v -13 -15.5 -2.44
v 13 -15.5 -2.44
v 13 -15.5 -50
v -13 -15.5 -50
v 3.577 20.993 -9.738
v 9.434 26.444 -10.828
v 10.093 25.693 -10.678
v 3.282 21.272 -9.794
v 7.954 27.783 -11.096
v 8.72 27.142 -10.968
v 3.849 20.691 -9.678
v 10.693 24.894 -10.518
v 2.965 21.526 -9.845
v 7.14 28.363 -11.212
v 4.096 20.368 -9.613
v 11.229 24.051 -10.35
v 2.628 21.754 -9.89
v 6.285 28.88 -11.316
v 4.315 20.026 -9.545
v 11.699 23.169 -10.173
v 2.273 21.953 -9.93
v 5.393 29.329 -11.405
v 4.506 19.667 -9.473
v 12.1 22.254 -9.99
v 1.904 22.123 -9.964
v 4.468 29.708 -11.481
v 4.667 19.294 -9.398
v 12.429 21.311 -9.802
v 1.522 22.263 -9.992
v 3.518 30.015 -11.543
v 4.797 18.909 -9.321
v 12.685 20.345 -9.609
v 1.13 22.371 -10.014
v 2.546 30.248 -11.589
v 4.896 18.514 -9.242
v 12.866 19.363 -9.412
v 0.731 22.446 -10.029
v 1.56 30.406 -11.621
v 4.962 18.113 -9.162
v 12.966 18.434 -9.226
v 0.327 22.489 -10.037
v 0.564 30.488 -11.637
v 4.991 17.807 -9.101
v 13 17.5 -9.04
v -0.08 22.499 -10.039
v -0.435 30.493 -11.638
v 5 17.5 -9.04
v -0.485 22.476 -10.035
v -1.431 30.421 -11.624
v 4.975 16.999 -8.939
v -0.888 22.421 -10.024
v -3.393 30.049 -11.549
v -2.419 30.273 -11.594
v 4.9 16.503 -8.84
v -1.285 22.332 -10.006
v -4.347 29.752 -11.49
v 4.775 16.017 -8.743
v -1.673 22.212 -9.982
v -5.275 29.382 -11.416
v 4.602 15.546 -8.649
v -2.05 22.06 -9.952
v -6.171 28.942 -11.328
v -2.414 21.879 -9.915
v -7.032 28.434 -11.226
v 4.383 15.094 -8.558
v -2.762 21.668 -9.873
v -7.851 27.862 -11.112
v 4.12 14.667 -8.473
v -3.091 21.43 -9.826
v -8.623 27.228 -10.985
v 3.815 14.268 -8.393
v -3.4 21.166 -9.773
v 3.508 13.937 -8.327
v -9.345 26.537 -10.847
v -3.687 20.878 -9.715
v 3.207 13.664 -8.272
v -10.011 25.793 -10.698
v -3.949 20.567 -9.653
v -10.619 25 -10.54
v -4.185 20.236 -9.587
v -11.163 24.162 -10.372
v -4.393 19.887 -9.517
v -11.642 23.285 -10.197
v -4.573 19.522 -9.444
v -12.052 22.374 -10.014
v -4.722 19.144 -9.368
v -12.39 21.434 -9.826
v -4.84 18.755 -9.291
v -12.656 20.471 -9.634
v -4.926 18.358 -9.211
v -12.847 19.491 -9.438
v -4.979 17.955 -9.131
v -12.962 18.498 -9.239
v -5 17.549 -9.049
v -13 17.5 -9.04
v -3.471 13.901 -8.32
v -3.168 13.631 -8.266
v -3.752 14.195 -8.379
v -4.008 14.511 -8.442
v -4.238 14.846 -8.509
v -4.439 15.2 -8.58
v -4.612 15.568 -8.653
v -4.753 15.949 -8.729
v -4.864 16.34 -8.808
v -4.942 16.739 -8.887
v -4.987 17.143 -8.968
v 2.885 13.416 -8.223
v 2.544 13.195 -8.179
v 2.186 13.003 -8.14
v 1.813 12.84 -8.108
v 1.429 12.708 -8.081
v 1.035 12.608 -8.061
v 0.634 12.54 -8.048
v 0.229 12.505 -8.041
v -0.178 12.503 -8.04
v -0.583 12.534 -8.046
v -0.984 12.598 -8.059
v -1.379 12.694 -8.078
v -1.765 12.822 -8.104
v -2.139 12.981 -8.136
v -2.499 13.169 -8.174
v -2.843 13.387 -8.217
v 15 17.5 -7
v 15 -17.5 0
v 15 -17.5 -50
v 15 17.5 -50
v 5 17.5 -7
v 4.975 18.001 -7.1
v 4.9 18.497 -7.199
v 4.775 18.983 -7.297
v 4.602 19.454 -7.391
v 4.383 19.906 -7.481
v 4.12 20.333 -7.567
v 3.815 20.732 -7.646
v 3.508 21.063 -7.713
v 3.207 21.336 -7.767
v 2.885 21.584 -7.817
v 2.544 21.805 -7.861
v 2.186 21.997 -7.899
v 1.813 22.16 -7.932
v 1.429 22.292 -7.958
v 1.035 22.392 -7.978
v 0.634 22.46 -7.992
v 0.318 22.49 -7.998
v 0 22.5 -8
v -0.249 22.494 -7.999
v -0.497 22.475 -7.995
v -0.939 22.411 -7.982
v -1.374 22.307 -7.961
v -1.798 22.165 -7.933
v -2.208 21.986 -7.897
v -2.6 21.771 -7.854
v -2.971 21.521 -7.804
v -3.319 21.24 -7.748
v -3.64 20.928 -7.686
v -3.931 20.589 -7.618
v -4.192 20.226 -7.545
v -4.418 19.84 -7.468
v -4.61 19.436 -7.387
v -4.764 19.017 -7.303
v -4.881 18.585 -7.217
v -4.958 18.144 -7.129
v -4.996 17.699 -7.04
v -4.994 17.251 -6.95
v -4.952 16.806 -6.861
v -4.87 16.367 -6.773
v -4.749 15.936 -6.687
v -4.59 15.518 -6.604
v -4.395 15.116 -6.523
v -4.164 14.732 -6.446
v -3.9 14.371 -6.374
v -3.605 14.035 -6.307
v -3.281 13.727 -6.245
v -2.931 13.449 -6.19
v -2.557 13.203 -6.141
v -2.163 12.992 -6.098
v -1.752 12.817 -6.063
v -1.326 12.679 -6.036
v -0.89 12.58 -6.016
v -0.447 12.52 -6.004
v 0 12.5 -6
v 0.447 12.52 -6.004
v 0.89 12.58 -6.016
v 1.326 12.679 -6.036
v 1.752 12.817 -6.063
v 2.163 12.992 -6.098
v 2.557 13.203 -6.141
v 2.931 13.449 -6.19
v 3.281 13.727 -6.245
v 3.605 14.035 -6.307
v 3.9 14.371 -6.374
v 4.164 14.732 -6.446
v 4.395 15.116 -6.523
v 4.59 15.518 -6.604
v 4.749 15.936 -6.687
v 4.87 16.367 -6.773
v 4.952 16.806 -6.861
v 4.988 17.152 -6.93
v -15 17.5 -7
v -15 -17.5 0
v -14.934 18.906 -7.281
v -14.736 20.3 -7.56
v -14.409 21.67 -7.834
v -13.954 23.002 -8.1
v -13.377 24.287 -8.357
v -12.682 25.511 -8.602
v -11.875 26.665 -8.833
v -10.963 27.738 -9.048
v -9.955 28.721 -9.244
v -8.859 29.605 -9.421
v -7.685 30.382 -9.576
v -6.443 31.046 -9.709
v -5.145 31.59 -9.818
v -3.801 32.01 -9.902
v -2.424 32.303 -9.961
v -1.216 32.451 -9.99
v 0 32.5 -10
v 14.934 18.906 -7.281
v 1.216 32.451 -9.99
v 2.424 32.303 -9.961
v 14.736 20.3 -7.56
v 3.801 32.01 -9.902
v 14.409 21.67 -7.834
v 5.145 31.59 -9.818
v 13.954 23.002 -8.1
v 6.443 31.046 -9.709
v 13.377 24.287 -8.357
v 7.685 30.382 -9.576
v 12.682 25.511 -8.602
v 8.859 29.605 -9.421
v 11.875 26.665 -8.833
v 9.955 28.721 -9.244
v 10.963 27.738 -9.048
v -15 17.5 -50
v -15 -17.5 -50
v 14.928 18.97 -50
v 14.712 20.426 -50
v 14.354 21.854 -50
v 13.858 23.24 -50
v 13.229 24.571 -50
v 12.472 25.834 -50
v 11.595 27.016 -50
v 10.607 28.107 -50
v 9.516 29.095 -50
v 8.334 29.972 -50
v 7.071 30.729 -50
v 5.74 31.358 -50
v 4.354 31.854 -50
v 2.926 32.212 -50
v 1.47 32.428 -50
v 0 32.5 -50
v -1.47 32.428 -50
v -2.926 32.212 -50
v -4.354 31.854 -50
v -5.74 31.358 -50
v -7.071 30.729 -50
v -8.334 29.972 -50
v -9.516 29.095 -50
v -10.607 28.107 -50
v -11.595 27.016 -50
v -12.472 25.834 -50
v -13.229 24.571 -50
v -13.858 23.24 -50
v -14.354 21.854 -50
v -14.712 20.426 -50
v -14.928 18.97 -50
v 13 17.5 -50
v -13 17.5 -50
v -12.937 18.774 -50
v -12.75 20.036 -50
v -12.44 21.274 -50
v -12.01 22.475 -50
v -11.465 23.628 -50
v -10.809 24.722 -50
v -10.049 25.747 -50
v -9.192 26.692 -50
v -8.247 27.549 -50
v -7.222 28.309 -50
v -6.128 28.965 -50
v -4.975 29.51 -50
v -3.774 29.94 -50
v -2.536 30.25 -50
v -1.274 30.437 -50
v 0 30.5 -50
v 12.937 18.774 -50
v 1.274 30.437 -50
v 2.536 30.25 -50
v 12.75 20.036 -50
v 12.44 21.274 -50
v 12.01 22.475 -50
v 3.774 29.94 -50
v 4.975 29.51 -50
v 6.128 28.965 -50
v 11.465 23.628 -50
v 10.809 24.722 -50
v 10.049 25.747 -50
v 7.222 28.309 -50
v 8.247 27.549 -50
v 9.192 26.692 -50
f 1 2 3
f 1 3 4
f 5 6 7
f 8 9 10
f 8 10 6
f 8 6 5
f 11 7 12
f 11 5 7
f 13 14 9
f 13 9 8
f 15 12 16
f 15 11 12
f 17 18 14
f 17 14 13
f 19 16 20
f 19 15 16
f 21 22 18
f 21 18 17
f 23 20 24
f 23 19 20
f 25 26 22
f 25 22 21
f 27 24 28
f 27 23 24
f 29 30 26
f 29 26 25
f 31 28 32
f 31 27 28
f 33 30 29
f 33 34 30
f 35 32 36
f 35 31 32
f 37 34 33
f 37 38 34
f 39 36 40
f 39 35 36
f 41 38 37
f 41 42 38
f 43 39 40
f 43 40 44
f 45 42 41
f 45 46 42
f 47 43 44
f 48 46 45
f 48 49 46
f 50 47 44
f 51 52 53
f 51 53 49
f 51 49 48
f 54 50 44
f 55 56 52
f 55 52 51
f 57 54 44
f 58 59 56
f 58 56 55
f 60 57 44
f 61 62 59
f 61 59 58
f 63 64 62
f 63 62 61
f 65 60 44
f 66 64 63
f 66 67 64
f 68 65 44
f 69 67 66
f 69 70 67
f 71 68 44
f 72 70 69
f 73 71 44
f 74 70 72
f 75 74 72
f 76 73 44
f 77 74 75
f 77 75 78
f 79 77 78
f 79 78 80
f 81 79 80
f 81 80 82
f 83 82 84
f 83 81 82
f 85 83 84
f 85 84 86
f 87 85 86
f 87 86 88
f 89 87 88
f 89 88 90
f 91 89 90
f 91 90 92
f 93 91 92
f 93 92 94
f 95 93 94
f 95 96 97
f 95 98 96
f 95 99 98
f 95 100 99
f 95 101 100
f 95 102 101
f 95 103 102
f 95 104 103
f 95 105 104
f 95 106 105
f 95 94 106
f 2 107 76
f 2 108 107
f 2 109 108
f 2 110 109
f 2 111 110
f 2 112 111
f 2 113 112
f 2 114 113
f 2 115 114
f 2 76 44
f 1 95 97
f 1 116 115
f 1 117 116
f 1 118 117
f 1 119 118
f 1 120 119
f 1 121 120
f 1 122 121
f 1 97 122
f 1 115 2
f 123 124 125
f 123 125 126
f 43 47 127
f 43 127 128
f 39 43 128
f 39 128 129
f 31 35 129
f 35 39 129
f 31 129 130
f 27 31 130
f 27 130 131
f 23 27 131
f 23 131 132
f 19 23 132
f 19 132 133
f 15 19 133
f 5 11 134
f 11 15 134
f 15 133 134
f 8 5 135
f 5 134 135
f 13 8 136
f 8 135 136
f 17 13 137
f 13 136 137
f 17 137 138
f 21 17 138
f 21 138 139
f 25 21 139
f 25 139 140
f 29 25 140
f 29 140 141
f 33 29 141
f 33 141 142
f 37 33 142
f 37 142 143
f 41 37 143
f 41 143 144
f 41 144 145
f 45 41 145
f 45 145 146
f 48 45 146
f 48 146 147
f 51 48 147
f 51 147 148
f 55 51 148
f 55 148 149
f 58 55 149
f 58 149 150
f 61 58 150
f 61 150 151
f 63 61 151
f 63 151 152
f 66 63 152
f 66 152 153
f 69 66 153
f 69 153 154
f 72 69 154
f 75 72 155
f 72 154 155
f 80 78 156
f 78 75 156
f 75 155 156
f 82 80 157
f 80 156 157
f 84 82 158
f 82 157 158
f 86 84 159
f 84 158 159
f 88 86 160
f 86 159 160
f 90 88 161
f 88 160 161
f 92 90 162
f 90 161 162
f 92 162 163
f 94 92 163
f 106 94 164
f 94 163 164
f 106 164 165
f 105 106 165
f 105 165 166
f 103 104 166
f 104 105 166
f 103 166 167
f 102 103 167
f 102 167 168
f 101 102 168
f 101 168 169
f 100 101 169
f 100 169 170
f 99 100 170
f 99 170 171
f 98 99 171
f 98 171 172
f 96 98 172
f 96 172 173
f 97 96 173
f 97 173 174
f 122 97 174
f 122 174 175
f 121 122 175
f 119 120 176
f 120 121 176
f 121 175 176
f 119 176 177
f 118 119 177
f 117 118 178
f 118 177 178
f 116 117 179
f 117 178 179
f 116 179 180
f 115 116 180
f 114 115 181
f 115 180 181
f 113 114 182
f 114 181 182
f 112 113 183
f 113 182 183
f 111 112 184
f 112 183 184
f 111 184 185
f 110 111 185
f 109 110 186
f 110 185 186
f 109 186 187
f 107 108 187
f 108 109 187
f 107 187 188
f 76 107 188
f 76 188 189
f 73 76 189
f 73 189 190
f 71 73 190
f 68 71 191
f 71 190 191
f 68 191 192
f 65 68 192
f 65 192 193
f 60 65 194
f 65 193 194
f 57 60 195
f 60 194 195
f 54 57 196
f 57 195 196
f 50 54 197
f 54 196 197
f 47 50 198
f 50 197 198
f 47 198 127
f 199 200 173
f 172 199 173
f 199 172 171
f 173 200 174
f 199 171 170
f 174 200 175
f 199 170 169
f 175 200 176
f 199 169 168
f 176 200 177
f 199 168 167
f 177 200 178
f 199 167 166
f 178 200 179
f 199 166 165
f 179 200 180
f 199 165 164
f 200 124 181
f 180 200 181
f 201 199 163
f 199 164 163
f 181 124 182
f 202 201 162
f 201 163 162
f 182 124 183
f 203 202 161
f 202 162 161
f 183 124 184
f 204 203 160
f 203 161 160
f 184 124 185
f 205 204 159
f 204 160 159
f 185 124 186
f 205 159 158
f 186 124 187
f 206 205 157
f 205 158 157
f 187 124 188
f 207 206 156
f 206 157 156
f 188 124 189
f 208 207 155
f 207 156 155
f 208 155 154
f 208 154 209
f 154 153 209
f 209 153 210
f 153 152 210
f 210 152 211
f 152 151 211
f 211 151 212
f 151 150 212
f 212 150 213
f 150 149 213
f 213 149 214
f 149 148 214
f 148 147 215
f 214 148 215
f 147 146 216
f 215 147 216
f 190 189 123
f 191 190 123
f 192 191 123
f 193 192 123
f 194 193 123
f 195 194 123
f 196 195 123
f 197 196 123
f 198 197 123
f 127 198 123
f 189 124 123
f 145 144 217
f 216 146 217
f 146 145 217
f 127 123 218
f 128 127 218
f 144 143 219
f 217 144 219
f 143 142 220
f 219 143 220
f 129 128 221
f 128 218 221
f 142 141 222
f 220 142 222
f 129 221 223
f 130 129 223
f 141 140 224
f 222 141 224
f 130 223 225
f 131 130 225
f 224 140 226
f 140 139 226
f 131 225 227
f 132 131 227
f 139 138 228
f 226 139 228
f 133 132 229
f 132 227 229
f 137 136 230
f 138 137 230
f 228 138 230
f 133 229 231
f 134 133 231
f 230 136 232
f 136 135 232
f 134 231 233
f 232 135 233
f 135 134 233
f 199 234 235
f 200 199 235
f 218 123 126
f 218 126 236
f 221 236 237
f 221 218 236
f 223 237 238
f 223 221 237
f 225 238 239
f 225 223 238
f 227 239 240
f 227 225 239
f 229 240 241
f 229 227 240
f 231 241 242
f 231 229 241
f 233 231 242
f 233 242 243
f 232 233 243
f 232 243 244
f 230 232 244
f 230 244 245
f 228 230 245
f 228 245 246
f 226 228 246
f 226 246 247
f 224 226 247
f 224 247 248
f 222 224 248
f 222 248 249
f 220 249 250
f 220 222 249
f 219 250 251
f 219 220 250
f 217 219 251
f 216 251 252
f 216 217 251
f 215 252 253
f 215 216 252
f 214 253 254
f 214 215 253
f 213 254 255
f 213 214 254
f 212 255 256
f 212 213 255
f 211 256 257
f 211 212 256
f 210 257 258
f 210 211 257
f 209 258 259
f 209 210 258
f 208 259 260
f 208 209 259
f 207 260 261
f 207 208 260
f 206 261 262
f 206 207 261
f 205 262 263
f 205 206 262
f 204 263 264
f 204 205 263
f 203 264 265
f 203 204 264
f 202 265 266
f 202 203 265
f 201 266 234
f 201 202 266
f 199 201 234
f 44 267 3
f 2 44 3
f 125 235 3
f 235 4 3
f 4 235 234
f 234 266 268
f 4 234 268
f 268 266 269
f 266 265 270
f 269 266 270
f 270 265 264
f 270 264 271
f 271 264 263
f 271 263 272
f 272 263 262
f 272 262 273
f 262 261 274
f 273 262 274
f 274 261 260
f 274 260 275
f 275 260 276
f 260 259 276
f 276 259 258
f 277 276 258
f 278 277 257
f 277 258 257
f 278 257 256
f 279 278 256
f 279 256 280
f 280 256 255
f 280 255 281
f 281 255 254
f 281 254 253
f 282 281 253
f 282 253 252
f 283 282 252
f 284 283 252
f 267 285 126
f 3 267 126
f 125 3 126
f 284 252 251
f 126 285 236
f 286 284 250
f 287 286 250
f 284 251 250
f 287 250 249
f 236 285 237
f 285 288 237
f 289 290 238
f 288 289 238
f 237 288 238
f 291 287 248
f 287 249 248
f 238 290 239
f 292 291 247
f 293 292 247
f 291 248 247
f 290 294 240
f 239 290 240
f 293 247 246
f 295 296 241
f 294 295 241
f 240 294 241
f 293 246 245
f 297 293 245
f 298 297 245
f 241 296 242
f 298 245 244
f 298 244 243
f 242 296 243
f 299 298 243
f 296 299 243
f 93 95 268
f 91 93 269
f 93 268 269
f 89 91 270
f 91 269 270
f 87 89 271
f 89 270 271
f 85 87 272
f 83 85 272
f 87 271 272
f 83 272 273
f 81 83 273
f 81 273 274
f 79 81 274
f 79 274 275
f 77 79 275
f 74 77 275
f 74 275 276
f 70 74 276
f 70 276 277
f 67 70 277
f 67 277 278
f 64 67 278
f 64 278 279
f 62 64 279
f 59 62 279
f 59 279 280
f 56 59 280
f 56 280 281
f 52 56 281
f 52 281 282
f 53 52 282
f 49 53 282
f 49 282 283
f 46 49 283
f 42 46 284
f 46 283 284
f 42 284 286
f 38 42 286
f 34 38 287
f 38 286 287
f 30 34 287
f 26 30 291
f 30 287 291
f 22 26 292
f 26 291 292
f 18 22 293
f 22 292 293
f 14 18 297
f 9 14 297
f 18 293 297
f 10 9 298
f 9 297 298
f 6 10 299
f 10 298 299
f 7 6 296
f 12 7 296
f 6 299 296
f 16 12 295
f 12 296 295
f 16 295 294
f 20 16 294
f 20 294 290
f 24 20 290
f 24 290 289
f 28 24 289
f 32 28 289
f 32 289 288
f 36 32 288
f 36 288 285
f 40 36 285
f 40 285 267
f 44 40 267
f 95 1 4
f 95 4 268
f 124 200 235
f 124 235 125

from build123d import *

# Parameters (mm, degrees)
ESQUISSE1_R                  = 5
BOSS_EXTRU_1_DEPTH           = 50
ENL_V_MAT_EXTRU_1_DEPTH      = 16
ENL_V_MAT_EXTRU_1_DEPTH_BACK = 16
ENL_V_MAT_EXTRU_2_REACH      = 52


with BuildPart() as part:
    # Esquisse1 → Boss.-Extru.1 (new body)
    with BuildSketch(Plane.XY):
        with BuildLine():
            Line((-15, -17.5), (15, -17.5))
            Line((15, -17.5), (15, 17.5))
            ThreePointArc((15, 17.5), (0, 32.5), (-15, 17.5))
            Line((-15, 17.5), (-15, -17.5))
        make_face()
        with Locations((0, 17.5)):
            Circle(ESQUISSE1_R, mode=Mode.SUBTRACT)
    extrude(amount=-BOSS_EXTRU_1_DEPTH)

    # Esquisse2 → Enlèv. mat.-Extru.1 (cut, two sides)
    with BuildSketch(Plane(origin=(0, 0, 0), x_dir=(0, 0, -1), z_dir=(1, 0, 0))) as enl_v_mat_extru_1_sk:
        Polygon((0, -17.5), (10, 32.5), (0, 32.5), align=None)
    extrude(amount=ENL_V_MAT_EXTRU_1_DEPTH, mode=Mode.SUBTRACT)
    extrude(enl_v_mat_extru_1_sk.sketch, amount=-ENL_V_MAT_EXTRU_1_DEPTH_BACK, mode=Mode.SUBTRACT)

    # Enlèv. mat.-Extru.2: up to this plane
    enl_v_mat_extru_2_end = Plane(origin=(-15, -17.89223227, -1.961161351), z_dir=(0, -0.196116135, -0.980580676))
    # Esquisse3 → Enlèv. mat.-Extru.2 (cut, up to the surface)
    with BuildSketch(Plane(origin=(0, 0, -50), x_dir=(-1, 0, 0), z_dir=(0, 0, -1)), mode=Mode.PRIVATE) as enl_v_mat_extru_2_sk1:
        with BuildLine():
            Line((-13, 17.5), (-13, -15.5))
            Line((-13, -15.5), (13, -15.5))
            Line((13, -15.5), (13, 17.5))
            ThreePointArc((13, 17.5), (0, 30.5), (-13, 17.5))
        make_face()
    enl_v_mat_extru_2_tool1 = split(extrude(enl_v_mat_extru_2_sk1.sketch, amount=-ENL_V_MAT_EXTRU_2_REACH, mode=Mode.PRIVATE), bisect_by=enl_v_mat_extru_2_end, keep=Keep.BOTH, mode=Mode.PRIVATE)
    add(enl_v_mat_extru_2_tool1.solids().sort_by_distance((0, 6.202507, -50))[0], mode=Mode.SUBTRACT)


solid = part.part
